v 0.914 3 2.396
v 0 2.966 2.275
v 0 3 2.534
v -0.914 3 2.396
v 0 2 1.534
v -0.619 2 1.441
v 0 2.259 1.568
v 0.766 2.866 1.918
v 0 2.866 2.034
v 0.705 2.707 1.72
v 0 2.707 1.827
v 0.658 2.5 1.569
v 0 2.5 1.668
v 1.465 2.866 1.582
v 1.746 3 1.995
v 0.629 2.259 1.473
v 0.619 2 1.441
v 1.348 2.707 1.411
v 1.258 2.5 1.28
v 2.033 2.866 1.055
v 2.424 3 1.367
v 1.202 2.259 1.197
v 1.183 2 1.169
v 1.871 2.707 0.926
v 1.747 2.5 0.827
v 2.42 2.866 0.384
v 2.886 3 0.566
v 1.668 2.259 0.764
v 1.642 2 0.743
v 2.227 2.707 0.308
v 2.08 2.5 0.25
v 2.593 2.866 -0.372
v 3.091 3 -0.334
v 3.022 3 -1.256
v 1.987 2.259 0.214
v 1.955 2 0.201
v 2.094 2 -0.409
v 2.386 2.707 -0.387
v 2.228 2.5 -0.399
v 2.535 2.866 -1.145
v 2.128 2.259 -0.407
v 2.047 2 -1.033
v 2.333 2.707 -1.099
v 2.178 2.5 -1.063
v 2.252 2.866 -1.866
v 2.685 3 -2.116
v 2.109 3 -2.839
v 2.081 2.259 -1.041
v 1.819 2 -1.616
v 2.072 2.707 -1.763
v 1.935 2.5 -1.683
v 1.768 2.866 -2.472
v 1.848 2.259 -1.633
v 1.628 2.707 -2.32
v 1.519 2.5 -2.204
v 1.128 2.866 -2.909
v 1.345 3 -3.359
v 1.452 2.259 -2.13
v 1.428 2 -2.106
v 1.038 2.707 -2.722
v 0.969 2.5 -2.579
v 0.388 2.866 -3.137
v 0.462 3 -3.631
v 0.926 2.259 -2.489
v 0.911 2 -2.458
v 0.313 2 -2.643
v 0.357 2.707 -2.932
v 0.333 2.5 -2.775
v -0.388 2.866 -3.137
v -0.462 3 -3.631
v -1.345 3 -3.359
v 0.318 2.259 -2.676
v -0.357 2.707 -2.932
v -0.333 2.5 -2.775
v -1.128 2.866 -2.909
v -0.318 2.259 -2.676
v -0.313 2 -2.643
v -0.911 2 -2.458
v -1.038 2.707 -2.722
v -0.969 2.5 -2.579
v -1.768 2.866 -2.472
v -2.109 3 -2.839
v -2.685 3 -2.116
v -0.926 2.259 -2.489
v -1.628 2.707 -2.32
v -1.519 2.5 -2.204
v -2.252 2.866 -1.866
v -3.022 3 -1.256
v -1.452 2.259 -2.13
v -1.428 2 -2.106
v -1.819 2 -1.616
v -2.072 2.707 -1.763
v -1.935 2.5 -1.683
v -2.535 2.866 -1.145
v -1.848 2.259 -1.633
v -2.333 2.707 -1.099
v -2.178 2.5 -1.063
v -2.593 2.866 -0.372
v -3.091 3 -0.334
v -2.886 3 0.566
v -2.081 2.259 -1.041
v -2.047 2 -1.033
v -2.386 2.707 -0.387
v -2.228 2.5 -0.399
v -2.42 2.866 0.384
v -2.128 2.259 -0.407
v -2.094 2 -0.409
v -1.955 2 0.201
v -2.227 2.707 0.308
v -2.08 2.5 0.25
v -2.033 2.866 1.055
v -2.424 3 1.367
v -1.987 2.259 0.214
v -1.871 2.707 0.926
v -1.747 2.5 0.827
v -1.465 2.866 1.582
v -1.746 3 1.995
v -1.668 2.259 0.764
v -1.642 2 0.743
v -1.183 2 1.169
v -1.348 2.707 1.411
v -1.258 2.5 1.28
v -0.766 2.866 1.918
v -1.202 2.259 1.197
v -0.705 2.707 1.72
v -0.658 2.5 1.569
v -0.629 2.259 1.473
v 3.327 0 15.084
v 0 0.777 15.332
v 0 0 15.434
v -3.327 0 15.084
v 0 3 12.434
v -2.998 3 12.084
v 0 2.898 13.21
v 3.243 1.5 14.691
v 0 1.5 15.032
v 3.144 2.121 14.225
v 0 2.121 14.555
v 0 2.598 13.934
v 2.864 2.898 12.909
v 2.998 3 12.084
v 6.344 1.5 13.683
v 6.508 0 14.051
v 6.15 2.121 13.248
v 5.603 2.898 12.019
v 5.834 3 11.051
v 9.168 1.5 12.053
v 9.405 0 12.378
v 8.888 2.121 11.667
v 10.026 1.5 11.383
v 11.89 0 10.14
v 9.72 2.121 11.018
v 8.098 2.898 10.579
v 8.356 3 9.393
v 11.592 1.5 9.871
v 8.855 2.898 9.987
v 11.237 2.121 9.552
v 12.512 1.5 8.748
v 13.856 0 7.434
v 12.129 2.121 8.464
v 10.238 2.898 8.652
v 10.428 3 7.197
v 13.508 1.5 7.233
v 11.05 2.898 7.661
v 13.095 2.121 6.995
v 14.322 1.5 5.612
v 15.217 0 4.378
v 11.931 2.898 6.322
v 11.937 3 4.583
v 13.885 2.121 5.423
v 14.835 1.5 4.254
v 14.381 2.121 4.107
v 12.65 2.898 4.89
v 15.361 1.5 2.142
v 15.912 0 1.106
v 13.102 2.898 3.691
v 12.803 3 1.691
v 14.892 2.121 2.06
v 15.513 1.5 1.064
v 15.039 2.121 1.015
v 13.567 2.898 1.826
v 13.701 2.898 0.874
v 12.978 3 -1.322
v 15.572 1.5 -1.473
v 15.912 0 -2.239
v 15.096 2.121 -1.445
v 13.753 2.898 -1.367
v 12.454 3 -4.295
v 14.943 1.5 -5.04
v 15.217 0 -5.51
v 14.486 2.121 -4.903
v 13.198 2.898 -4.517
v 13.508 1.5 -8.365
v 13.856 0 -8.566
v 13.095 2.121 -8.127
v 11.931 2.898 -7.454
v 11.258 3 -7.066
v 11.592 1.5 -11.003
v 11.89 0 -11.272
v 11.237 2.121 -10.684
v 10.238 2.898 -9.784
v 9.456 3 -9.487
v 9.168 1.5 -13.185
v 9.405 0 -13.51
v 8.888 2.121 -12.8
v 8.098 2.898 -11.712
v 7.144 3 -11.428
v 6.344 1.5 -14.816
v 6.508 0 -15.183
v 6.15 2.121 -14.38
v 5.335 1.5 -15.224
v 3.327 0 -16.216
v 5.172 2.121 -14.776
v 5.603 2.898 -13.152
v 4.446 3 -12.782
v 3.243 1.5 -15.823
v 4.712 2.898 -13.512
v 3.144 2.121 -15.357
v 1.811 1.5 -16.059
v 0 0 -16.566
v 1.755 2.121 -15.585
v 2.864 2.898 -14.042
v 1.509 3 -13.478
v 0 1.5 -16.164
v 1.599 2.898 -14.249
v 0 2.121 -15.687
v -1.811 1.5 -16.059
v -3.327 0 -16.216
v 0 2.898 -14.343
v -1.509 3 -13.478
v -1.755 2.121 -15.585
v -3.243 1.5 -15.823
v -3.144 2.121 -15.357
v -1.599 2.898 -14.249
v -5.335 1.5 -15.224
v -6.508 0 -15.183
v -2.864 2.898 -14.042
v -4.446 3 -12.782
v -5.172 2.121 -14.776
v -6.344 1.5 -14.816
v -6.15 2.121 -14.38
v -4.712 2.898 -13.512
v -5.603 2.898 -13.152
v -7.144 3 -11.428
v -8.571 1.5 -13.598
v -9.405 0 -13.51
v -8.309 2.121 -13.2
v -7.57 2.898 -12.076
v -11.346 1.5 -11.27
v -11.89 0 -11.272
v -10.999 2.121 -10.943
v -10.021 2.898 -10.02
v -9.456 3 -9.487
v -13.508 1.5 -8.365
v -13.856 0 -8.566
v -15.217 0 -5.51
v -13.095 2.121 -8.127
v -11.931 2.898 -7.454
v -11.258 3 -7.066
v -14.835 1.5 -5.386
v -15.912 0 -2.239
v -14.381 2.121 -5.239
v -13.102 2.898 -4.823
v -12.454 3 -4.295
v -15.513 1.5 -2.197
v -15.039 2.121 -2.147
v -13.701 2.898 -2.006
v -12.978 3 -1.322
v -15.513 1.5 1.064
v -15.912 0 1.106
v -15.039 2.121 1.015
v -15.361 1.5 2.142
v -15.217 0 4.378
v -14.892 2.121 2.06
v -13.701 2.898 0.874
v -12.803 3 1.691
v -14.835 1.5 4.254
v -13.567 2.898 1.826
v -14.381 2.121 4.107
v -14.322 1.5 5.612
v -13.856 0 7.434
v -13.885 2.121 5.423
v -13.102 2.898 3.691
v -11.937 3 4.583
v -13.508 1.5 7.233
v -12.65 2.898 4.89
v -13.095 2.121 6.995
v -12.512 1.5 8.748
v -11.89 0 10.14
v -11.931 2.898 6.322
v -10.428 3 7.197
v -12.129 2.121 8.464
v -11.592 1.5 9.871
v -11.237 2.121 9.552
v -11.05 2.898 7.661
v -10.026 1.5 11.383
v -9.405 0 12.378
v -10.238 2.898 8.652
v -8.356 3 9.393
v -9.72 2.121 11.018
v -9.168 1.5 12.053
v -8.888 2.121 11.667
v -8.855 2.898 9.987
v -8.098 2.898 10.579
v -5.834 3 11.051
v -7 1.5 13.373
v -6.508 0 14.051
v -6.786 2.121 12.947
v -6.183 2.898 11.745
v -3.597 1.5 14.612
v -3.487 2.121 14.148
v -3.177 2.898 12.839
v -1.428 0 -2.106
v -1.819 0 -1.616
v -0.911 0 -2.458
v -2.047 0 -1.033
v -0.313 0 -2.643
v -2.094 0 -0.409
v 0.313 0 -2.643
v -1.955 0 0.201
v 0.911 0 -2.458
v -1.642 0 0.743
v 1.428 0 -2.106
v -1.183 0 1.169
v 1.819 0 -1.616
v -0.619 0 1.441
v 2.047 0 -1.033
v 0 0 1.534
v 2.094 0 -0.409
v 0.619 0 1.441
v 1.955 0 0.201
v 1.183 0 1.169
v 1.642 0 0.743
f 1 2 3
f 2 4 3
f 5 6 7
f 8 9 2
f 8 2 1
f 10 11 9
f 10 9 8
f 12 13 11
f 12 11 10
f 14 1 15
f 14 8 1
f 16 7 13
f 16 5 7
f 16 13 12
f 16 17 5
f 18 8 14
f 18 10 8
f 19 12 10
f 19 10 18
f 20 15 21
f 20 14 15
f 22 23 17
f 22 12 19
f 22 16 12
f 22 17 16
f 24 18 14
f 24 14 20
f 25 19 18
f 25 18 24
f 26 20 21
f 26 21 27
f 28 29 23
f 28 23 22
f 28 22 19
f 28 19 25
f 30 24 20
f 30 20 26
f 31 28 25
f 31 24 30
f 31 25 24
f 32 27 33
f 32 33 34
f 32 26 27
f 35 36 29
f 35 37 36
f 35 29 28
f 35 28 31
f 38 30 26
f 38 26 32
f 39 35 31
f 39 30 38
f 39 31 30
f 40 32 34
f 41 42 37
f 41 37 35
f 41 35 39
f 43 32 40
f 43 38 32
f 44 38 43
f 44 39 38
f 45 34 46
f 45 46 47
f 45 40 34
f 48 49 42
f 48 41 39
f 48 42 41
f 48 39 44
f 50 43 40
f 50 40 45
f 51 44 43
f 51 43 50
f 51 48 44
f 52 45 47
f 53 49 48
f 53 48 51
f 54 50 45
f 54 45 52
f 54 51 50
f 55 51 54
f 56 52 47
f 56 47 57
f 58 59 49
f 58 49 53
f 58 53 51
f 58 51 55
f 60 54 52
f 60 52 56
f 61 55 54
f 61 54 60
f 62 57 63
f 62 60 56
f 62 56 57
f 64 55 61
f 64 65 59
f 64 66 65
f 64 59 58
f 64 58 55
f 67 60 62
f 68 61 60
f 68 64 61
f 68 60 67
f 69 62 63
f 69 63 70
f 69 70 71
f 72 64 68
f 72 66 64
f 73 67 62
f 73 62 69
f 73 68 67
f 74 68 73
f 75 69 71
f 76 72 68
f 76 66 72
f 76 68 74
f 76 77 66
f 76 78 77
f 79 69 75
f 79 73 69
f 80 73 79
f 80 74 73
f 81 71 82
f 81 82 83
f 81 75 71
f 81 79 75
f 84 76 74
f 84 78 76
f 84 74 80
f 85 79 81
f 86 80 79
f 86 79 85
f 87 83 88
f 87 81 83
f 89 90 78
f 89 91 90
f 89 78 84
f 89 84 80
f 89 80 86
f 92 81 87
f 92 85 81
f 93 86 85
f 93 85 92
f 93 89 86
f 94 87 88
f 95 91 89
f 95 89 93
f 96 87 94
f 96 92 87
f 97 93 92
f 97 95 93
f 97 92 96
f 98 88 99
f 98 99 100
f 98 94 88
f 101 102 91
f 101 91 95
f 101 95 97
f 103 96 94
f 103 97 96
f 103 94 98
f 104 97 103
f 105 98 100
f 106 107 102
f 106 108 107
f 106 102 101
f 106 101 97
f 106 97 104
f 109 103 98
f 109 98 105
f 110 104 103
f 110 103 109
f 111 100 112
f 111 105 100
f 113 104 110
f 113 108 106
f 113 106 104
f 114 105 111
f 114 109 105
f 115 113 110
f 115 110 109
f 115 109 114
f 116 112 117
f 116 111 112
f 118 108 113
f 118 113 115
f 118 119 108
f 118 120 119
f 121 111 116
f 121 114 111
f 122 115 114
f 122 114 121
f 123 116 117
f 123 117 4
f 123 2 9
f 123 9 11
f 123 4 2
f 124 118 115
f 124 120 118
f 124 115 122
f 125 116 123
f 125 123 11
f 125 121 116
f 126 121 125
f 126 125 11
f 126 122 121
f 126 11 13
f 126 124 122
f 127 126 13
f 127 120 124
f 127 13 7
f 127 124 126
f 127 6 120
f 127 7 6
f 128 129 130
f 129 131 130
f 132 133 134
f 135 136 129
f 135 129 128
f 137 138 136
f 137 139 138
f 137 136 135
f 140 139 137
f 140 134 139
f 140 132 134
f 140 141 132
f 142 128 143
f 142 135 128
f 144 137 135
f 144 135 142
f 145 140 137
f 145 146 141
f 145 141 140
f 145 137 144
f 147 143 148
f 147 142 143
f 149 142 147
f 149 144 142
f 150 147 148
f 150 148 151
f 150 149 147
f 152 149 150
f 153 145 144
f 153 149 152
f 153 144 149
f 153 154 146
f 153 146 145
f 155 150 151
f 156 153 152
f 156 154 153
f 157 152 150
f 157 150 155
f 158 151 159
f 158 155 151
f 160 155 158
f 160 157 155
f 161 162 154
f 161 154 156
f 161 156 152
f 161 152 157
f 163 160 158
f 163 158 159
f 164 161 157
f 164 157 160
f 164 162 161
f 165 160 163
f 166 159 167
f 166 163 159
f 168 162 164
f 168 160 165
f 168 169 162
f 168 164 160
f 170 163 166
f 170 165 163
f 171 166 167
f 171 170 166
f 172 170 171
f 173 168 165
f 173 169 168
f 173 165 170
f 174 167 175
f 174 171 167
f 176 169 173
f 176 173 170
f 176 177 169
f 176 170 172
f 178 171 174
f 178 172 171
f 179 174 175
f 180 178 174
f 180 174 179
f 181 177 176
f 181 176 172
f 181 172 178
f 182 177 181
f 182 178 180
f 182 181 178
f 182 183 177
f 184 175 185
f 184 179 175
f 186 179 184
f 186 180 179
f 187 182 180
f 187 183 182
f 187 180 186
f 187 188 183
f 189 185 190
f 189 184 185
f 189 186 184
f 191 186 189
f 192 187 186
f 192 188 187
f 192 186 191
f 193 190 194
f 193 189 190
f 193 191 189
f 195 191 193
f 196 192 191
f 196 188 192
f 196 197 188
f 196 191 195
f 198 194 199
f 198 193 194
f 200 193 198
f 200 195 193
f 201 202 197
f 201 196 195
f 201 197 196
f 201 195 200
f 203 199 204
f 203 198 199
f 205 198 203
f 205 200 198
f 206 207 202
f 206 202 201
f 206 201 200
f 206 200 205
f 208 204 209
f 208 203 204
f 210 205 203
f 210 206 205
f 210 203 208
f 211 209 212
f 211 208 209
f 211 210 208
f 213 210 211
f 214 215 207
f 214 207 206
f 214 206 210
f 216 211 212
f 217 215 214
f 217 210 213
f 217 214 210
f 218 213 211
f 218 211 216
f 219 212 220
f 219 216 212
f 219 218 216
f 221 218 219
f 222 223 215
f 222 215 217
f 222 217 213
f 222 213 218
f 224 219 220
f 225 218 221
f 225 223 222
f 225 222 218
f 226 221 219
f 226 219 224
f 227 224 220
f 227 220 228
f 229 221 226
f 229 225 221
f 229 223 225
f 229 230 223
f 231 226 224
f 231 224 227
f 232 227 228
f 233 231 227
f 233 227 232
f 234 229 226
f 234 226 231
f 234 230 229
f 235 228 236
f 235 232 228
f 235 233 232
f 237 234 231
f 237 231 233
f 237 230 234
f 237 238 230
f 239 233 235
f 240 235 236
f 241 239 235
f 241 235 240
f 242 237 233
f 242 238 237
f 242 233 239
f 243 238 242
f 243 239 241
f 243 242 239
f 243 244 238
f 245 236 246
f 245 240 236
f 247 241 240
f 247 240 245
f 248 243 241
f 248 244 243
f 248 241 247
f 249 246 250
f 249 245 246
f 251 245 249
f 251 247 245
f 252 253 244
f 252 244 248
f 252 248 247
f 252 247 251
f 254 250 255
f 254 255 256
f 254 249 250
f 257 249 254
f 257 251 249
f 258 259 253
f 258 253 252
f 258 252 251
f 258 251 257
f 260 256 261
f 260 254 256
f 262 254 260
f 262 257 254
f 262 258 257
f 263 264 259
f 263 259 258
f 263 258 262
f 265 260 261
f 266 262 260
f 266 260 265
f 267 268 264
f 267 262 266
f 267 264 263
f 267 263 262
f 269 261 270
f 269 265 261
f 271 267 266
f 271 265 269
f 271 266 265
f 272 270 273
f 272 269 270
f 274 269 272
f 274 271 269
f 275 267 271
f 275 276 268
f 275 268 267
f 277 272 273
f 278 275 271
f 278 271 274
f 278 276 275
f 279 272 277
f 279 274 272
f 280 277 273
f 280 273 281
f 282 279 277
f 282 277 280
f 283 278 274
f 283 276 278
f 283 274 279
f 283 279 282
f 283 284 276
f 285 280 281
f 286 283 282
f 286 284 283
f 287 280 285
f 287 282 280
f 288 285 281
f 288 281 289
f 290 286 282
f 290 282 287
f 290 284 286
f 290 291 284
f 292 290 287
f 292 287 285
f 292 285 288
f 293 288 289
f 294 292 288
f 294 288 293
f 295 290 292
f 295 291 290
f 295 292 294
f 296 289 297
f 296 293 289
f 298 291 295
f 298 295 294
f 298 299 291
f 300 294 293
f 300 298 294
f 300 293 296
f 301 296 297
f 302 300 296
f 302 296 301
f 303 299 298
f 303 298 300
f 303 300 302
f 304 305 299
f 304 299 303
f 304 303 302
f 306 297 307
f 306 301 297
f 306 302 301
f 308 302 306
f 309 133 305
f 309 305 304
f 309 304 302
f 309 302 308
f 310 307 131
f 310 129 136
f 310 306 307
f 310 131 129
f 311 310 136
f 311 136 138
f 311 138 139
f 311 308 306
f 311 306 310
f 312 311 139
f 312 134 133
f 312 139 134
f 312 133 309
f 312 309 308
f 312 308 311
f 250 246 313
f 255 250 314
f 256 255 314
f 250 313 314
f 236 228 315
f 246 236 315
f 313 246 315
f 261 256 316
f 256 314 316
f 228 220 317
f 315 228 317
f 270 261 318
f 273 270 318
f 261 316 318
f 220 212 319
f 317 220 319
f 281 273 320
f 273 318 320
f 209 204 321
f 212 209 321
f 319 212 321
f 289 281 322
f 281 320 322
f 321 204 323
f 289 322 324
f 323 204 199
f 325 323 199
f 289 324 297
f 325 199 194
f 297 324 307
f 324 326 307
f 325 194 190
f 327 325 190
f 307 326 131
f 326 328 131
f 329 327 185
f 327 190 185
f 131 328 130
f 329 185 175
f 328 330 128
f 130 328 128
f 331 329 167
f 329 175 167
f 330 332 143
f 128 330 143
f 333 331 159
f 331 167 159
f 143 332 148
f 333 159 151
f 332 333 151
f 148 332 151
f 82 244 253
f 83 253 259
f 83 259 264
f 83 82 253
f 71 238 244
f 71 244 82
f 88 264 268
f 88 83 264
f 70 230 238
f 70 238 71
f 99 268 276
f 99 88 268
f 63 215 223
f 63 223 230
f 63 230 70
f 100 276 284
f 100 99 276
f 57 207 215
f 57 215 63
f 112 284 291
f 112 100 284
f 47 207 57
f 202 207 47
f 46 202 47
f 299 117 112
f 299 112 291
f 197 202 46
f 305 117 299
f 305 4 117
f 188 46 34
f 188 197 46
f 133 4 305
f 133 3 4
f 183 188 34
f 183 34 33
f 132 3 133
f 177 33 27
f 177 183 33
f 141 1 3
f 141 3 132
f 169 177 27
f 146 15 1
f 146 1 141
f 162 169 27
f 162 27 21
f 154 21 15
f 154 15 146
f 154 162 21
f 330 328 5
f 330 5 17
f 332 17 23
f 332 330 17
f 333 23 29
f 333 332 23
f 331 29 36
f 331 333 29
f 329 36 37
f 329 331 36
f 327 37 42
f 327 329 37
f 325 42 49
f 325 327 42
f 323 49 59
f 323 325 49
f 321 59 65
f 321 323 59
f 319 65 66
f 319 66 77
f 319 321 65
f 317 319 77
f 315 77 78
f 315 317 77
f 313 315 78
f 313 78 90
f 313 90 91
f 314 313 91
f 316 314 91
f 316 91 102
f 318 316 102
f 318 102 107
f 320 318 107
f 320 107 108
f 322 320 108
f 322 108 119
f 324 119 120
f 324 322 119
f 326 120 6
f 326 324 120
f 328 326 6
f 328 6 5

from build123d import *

# Parameters (mm, degrees)
SKETCH_1_R      = 16
SKETCH_1_R_2    = 2.1
EXTRUDE_1_DEPTH = 3
FILLET_1_R      = 3
FILLET_2_R      = 1


with BuildPart() as part:
    # Эскиз1 → Бобышка-Вытянуть1 (new body)
    with BuildSketch(Plane(origin=(0, 0, 0), x_dir=(1, 0, 0), z_dir=(0, 1, 0))):
        with Locations(Location((0, 0.566108198, 0), (0, 0, 270))):
            Circle(SKETCH_1_R)
        with Locations(Location((0, 0.566108198, 0), (0, 0, 270))):
            Circle(SKETCH_1_R_2, mode=Mode.SUBTRACT)
    extrude(amount=EXTRUDE_1_DEPTH)

    # Скругление1
    fillet_1_edges = [part.edges().sort_by_distance(p)[0] for p in [
        (0, 3, -16.566108198),
    ]]
    fillet(fillet_1_edges, radius=FILLET_1_R - 0.0001)  # a hair under: the kernel refuses the full size

    # Скругление2
    fillet_2_edges = [part.edges().sort_by_distance(p)[0] for p in [
        (0, 3, -2.666108198),
    ]]
    fillet(fillet_2_edges, radius=FILLET_2_R)


solid = part.part
